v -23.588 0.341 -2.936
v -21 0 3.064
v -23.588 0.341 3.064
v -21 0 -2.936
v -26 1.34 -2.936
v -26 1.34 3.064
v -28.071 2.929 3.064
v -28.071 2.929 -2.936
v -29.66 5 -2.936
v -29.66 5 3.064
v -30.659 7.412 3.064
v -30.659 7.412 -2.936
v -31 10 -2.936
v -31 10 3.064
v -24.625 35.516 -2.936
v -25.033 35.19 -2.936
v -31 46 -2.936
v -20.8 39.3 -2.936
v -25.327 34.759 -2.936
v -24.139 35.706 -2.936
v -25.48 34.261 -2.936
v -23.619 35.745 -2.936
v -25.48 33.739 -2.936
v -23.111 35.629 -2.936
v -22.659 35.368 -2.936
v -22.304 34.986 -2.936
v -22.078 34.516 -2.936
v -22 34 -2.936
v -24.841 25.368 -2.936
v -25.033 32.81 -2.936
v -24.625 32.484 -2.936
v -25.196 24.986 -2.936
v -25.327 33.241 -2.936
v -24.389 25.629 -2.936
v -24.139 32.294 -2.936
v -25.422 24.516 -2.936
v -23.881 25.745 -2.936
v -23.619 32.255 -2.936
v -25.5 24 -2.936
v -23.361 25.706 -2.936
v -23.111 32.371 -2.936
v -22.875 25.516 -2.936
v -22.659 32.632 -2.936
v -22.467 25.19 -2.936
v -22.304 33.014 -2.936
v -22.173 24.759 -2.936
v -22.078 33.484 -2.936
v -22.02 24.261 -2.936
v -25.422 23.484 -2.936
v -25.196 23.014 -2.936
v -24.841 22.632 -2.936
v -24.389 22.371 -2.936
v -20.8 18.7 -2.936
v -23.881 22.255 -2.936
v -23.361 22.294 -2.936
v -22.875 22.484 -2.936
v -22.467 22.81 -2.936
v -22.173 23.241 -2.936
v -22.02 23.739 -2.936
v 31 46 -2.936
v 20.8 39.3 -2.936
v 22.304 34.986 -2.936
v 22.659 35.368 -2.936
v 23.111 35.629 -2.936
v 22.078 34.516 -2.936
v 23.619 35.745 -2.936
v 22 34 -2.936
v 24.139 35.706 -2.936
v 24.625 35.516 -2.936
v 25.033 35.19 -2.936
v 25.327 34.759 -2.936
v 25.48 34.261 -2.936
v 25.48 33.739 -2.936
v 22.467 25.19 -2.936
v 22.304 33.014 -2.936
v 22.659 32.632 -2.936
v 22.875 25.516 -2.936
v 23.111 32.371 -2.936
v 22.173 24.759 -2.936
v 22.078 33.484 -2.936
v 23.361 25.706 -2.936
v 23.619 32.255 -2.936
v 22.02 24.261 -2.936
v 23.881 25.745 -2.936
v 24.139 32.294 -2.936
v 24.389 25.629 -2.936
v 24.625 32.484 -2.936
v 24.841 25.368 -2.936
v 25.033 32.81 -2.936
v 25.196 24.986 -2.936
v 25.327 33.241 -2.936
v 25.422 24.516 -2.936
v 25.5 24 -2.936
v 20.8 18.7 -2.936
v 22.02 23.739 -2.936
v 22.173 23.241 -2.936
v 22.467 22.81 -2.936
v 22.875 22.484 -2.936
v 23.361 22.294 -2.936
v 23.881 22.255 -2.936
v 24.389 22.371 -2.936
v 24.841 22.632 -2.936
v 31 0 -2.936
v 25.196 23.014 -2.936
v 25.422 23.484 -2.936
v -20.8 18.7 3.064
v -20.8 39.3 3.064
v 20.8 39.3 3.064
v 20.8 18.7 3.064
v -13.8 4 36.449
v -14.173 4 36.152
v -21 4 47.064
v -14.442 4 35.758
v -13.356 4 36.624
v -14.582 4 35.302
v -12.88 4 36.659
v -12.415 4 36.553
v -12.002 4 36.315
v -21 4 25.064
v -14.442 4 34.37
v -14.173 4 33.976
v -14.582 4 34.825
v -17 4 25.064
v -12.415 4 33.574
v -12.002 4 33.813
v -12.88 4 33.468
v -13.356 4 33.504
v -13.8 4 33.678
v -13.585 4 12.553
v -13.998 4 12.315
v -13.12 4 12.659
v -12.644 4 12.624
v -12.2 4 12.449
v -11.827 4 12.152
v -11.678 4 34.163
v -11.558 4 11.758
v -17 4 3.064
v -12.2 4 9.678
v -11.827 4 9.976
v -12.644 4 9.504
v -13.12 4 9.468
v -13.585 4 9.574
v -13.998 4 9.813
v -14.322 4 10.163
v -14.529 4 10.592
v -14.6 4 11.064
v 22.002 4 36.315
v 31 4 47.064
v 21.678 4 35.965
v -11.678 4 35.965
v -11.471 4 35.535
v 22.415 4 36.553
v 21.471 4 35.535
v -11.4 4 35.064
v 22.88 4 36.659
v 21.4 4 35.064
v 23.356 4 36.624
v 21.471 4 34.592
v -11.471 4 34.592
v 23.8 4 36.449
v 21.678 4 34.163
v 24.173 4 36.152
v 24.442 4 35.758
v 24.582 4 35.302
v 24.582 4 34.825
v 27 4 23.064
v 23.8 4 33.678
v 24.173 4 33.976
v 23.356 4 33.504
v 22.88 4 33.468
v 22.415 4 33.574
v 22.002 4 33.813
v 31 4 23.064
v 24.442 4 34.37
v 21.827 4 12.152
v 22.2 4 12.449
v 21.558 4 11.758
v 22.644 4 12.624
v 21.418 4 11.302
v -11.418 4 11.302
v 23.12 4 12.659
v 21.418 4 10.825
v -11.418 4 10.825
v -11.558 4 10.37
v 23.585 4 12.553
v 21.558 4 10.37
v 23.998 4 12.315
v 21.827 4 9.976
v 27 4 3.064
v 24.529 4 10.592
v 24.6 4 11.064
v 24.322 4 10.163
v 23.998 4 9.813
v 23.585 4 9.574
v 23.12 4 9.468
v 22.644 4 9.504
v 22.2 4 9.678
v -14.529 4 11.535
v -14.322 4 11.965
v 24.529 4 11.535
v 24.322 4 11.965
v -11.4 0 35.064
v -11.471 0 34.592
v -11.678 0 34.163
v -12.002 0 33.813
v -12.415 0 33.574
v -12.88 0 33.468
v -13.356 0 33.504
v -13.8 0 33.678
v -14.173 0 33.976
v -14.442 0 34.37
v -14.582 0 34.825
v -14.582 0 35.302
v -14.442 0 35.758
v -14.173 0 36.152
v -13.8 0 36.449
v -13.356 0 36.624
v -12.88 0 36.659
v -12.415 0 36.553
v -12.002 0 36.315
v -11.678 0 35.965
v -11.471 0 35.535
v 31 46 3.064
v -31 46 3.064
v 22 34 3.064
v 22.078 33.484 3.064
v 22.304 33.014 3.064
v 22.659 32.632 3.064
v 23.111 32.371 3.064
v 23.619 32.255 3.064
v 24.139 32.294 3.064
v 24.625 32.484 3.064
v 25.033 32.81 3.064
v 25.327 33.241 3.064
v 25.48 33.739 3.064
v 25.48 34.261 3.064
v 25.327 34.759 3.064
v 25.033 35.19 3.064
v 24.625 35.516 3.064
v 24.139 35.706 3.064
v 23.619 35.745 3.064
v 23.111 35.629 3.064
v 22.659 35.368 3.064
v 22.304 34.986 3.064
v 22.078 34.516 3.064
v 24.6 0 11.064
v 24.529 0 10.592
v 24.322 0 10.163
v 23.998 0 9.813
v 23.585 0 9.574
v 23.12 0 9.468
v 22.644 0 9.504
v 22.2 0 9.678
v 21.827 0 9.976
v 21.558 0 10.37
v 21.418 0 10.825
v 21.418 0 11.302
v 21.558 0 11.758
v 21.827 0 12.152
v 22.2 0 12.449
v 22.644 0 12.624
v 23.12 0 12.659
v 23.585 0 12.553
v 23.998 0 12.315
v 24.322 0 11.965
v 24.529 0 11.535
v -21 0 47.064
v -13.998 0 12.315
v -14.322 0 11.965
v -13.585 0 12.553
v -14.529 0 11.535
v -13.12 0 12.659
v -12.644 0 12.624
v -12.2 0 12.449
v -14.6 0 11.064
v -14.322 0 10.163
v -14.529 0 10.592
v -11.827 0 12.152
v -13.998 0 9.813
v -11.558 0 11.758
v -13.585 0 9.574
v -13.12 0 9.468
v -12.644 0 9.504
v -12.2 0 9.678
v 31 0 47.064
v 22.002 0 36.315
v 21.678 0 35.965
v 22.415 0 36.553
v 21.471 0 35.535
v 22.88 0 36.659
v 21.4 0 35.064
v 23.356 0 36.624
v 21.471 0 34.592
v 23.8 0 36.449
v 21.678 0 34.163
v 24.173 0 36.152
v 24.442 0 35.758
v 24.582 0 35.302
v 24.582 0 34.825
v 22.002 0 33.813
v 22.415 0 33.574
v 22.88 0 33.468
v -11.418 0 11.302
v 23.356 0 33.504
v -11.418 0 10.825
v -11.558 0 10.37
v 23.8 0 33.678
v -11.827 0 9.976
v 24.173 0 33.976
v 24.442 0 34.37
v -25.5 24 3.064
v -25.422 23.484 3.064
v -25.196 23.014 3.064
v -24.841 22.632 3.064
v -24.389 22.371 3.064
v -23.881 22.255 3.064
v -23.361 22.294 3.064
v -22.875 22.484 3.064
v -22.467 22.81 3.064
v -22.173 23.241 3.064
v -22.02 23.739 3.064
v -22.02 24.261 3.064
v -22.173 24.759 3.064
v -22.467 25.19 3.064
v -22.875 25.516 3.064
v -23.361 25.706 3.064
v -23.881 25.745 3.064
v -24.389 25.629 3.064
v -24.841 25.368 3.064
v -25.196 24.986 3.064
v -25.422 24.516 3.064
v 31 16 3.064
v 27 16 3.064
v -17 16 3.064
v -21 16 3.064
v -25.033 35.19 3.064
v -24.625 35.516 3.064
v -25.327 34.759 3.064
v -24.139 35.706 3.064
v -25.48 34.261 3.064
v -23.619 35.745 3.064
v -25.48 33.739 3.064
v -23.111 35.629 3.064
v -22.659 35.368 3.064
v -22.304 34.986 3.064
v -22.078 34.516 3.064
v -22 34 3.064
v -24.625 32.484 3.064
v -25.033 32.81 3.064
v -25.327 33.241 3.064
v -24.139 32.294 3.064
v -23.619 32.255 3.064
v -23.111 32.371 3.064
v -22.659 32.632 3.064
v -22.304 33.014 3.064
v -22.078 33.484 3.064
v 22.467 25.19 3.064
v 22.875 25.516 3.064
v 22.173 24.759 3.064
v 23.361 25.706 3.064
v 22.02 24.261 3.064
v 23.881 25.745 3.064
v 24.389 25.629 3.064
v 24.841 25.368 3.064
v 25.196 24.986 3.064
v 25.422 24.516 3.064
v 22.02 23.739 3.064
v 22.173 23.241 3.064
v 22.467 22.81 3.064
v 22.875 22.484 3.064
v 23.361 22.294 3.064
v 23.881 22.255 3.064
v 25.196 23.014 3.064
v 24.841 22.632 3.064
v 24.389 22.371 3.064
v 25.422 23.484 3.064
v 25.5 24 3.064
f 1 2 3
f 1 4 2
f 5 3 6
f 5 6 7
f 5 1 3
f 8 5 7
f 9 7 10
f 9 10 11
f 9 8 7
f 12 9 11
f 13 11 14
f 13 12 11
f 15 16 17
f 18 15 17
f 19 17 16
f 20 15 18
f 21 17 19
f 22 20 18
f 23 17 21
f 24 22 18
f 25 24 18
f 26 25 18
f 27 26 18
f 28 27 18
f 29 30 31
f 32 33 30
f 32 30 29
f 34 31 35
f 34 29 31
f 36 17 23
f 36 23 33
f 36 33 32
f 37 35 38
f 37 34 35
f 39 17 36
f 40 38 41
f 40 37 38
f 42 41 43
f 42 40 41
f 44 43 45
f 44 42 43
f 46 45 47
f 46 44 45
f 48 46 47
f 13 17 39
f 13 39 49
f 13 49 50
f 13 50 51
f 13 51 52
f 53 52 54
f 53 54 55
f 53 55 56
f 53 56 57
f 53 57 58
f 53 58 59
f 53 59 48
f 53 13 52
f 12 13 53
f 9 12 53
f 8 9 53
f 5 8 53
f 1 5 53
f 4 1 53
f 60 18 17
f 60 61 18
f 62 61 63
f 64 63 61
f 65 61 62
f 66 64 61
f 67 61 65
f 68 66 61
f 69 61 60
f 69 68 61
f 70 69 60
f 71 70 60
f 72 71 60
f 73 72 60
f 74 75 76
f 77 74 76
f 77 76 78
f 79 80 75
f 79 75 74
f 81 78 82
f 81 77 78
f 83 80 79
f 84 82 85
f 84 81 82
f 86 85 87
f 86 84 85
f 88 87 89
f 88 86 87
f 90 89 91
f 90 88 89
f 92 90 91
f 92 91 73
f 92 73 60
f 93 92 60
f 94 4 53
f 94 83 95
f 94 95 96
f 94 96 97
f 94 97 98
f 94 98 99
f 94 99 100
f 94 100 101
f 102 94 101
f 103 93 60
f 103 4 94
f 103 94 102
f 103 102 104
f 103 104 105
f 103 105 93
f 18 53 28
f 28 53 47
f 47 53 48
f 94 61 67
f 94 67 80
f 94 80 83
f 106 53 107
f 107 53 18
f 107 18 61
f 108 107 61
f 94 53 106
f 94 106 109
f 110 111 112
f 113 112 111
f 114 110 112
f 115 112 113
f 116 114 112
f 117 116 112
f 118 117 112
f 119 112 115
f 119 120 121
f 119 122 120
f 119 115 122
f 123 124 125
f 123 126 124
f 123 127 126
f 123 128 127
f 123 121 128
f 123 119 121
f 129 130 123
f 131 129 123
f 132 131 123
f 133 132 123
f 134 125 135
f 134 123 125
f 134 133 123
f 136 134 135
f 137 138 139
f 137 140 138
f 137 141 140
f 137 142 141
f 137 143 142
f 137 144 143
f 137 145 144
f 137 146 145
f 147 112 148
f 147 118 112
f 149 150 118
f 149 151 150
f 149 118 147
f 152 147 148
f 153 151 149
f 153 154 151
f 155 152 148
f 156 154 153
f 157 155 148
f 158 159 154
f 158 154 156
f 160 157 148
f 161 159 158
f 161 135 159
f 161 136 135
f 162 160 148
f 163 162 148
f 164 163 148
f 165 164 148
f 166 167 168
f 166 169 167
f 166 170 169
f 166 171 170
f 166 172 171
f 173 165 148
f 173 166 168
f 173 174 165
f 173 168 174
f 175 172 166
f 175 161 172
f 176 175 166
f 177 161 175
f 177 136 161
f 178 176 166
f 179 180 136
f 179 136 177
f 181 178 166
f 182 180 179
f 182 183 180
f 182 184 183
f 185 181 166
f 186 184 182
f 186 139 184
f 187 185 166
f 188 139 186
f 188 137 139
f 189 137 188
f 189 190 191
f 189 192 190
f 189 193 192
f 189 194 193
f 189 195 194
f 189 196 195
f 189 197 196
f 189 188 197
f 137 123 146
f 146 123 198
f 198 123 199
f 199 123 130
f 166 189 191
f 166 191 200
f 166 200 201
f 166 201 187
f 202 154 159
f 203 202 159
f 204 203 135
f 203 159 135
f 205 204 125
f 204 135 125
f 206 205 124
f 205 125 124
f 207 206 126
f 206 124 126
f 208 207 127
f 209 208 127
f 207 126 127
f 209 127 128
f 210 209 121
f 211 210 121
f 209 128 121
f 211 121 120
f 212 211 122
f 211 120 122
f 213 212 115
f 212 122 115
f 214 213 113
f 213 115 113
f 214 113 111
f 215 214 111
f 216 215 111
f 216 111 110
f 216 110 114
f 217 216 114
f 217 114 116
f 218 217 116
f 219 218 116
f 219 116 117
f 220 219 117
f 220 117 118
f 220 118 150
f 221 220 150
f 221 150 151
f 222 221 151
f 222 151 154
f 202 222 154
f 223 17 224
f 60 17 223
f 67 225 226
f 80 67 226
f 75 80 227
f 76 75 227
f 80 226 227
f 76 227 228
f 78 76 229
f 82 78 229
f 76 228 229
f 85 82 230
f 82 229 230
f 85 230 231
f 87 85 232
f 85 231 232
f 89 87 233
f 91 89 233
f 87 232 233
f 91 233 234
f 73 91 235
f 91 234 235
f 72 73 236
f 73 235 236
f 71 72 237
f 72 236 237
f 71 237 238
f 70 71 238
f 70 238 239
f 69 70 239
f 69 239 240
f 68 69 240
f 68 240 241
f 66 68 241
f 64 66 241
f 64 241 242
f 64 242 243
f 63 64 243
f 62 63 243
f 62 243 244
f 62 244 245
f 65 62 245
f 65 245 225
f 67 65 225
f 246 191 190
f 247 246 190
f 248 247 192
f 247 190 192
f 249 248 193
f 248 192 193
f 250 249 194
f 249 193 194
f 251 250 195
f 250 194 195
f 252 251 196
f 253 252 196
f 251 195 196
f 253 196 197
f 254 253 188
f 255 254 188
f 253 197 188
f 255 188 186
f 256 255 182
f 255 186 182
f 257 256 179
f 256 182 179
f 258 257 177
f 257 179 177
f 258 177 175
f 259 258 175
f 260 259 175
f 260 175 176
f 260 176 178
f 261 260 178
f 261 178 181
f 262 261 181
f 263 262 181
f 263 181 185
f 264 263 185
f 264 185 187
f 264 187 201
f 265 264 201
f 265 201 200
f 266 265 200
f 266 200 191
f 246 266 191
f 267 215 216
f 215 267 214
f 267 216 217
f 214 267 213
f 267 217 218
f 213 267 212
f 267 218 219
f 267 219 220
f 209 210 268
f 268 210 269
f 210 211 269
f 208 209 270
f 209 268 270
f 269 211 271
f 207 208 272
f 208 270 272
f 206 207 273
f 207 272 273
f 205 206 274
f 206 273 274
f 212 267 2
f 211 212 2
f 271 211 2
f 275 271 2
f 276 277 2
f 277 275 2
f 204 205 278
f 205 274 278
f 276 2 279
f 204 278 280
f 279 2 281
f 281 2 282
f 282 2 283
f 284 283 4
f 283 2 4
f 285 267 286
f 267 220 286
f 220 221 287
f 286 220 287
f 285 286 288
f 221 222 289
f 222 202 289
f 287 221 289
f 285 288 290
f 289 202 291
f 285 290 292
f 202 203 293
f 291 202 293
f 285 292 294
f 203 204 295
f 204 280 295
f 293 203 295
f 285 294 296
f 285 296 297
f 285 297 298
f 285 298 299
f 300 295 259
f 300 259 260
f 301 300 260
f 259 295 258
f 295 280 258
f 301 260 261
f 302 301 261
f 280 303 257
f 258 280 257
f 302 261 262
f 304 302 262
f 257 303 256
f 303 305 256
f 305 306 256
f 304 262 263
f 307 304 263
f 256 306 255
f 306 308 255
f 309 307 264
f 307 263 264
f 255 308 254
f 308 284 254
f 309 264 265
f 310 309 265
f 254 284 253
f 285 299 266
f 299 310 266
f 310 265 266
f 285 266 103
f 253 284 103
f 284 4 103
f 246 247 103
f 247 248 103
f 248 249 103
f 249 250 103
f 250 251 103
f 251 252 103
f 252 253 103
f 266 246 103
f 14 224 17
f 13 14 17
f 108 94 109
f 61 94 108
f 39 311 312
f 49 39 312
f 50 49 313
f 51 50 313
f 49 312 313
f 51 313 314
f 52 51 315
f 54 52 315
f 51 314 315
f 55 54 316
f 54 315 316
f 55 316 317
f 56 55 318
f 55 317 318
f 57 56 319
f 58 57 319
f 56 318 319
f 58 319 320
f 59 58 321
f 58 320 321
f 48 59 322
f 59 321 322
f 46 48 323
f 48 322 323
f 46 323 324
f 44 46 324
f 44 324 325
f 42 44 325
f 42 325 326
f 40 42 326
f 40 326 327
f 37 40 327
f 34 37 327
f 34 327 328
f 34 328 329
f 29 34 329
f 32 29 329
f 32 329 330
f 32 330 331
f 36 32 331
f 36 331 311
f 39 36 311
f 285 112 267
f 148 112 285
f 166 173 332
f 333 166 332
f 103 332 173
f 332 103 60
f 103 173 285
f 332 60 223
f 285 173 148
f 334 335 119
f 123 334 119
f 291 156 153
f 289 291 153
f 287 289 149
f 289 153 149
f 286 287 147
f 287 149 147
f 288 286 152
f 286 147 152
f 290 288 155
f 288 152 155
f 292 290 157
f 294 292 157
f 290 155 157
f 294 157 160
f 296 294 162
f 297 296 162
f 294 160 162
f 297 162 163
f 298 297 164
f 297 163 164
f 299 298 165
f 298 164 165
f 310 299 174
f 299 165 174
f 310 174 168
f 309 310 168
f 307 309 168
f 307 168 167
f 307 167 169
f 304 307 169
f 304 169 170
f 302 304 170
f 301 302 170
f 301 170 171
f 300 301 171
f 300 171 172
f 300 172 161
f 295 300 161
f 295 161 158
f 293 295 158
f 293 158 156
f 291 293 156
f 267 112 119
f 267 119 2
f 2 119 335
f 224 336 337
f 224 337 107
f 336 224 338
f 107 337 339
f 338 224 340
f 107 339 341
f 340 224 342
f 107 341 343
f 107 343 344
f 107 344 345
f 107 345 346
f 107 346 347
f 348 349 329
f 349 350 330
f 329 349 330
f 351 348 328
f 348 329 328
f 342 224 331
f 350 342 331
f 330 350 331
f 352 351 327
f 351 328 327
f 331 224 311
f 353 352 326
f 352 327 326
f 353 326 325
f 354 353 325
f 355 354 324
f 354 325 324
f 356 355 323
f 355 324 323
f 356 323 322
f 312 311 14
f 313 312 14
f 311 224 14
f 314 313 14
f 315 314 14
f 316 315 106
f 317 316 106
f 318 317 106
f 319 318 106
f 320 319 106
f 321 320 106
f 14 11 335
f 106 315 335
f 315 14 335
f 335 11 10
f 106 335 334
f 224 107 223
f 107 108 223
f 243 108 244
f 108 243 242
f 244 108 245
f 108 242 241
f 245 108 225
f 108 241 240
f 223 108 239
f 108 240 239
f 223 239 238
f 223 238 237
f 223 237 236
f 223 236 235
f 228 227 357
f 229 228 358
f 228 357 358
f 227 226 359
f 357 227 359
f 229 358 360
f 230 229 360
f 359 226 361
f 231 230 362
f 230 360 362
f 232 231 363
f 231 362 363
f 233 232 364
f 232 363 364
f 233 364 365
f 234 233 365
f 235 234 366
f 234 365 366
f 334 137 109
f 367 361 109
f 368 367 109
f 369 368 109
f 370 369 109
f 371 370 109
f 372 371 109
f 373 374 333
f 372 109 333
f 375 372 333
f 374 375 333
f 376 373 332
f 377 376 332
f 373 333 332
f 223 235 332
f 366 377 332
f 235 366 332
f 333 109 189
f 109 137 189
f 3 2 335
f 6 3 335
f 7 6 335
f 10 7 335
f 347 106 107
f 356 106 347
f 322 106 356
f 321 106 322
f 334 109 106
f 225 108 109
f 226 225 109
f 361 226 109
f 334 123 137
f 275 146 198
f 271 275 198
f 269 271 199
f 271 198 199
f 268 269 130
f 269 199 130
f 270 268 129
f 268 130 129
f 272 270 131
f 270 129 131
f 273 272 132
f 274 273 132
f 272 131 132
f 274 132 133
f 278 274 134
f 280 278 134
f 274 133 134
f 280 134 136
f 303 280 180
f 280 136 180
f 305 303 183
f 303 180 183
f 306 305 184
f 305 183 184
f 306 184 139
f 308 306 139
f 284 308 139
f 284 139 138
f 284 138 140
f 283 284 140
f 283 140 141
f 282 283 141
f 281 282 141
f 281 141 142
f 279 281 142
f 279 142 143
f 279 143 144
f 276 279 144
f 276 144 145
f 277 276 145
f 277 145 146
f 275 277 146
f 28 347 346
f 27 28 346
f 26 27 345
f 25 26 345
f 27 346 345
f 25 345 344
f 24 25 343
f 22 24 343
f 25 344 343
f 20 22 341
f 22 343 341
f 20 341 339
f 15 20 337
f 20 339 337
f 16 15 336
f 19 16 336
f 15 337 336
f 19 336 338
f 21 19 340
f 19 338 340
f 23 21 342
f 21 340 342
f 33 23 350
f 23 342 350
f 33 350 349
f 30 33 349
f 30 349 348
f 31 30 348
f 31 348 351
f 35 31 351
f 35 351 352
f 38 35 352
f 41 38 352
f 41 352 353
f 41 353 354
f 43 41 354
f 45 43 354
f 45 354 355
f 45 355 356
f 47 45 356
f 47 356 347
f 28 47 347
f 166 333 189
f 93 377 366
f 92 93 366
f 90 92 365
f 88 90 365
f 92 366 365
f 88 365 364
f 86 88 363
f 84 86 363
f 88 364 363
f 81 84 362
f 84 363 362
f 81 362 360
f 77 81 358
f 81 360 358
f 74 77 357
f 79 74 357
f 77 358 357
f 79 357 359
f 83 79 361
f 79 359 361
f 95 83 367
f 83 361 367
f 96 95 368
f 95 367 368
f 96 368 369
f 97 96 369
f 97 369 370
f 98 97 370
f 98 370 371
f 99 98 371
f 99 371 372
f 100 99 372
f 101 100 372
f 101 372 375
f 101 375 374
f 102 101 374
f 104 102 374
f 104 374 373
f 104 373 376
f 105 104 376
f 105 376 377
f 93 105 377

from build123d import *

# Parameters (mm, degrees)
SCHIZZO1_W                    = 62
SCHIZZO1_H                    = 6
ESTRUSIONE_ESTRUSIONE1_DEPTH  = 46
TAGLIO_ESTRUSIONE1_DEPTH      = 56.555261254
TAGLIO_ESTRUSIONE1_DEPTH_BACK = 56.555261254
SCHIZZO3_W                    = 41.6
SCHIZZO3_H                    = 20.6
SCHIZZO6_R                    = 1.75
TAGLIO_ESTRUSIONE2_DEPTH      = 56.794264938
SCHIZZO7_W                    = 52
SCHIZZO7_H                    = 4
ESTRUSIONE_ESTRUSIONE3_DEPTH  = 44
SCHIZZO10_R                   = 1.6
TAGLIO_ESTRUSIONE4_DEPTH      = 71.285162547
ESTRUSIONE_ESTRUSIONE4_DEPTH  = 4
ESTRUSIONE_ESTRUSIONE5_DEPTH  = 4
RACCORDO3_R                   = 10


with BuildPart() as part:
    # Schizzo1 → Estrusione-Estrusione1 (new body)
    with BuildSketch(Plane(origin=(0, 0, 0), x_dir=(1, 0, 0), z_dir=(0, 1, 0))):
        with Locations((0, -0.063829787)):
            Rectangle(SCHIZZO1_W, SCHIZZO1_H)
    extrude(amount=ESTRUSIONE_ESTRUSIONE1_DEPTH)

    # Schizzo3 → Taglio-Estrusione1 (cut, two sides: drawn at the far end of the back side and taken through both)
    with BuildSketch(Plane.XY.offset(-TAGLIO_ESTRUSIONE1_DEPTH_BACK)):
        with Locations((0, 29)):
            Rectangle(SCHIZZO3_W, SCHIZZO3_H)
    extrude(amount=TAGLIO_ESTRUSIONE1_DEPTH + TAGLIO_ESTRUSIONE1_DEPTH_BACK, mode=Mode.SUBTRACT)

    # Schizzo6 → Taglio-Estrusione2 (cut, through all)
    with BuildSketch(Plane.XY.offset(3.063829787)):
        with Locations((-23.75, 34)):
            Circle(SCHIZZO6_R)
        with Locations(Location((-23.75, 24, 0), (0, 0, 180))):
            Circle(SCHIZZO6_R)
        with Locations((23.75, 24)):
            Circle(SCHIZZO6_R)
        with Locations(Location((23.75, 34, 0), (0, 0, 180))):
            Circle(SCHIZZO6_R)
    extrude(amount=-TAGLIO_ESTRUSIONE2_DEPTH, mode=Mode.SUBTRACT)

    # Schizzo7 → Estrusione-Estrusione3 (add)
    with BuildSketch(Plane.XY.offset(3.063829787)):
        with Locations((5, 2)):
            Rectangle(SCHIZZO7_W, SCHIZZO7_H)
    extrude(amount=ESTRUSIONE_ESTRUSIONE3_DEPTH)

    # Schizzo10 → Taglio-Estrusione4 (cut, through all)
    with BuildSketch(Plane(origin=(0, 4, 0), x_dir=(1, 0, 0), z_dir=(0, 1, 0))):
        with Locations(Location((-13, -11.063829787, 0), (0, 0, 180))):
            Circle(SCHIZZO10_R)
        with Locations((-13, -35.063829787)):
            Circle(SCHIZZO10_R)
        with Locations(Location((23, -35.063829787, 0), (0, 0, 180))):
            Circle(SCHIZZO10_R)
        with Locations((23, -11.063829787)):
            Circle(SCHIZZO10_R)
    extrude(amount=-TAGLIO_ESTRUSIONE4_DEPTH, mode=Mode.SUBTRACT)

    # Schizzo13 → Estrusione-Estrusione4 (add)
    with BuildSketch(Plane(origin=(31, 0, 0), x_dir=(0, 0, -1), z_dir=(1, 0, 0))):
        Polygon((-23.063829787, 4), (-3.063829787, 16), (-3.063829787, 4), align=None)
    extrude(amount=-ESTRUSIONE_ESTRUSIONE4_DEPTH)

    # Schizzo15 → Estrusione-Estrusione5 (add)
    with BuildSketch(Plane.ZY.offset(21)):
        Polygon((25.063829787, 4), (3.063829787, 4), (3.063829787, 16), align=None)
    extrude(amount=-ESTRUSIONE_ESTRUSIONE5_DEPTH)

    # Raccordo3
    raccordo3_edges = [part.edges().sort_by_distance(p)[0] for p in [
        (-31, 0, 0.063829787),
    ]]
    fillet(raccordo3_edges, radius=RACCORDO3_R)


solid = part.part
